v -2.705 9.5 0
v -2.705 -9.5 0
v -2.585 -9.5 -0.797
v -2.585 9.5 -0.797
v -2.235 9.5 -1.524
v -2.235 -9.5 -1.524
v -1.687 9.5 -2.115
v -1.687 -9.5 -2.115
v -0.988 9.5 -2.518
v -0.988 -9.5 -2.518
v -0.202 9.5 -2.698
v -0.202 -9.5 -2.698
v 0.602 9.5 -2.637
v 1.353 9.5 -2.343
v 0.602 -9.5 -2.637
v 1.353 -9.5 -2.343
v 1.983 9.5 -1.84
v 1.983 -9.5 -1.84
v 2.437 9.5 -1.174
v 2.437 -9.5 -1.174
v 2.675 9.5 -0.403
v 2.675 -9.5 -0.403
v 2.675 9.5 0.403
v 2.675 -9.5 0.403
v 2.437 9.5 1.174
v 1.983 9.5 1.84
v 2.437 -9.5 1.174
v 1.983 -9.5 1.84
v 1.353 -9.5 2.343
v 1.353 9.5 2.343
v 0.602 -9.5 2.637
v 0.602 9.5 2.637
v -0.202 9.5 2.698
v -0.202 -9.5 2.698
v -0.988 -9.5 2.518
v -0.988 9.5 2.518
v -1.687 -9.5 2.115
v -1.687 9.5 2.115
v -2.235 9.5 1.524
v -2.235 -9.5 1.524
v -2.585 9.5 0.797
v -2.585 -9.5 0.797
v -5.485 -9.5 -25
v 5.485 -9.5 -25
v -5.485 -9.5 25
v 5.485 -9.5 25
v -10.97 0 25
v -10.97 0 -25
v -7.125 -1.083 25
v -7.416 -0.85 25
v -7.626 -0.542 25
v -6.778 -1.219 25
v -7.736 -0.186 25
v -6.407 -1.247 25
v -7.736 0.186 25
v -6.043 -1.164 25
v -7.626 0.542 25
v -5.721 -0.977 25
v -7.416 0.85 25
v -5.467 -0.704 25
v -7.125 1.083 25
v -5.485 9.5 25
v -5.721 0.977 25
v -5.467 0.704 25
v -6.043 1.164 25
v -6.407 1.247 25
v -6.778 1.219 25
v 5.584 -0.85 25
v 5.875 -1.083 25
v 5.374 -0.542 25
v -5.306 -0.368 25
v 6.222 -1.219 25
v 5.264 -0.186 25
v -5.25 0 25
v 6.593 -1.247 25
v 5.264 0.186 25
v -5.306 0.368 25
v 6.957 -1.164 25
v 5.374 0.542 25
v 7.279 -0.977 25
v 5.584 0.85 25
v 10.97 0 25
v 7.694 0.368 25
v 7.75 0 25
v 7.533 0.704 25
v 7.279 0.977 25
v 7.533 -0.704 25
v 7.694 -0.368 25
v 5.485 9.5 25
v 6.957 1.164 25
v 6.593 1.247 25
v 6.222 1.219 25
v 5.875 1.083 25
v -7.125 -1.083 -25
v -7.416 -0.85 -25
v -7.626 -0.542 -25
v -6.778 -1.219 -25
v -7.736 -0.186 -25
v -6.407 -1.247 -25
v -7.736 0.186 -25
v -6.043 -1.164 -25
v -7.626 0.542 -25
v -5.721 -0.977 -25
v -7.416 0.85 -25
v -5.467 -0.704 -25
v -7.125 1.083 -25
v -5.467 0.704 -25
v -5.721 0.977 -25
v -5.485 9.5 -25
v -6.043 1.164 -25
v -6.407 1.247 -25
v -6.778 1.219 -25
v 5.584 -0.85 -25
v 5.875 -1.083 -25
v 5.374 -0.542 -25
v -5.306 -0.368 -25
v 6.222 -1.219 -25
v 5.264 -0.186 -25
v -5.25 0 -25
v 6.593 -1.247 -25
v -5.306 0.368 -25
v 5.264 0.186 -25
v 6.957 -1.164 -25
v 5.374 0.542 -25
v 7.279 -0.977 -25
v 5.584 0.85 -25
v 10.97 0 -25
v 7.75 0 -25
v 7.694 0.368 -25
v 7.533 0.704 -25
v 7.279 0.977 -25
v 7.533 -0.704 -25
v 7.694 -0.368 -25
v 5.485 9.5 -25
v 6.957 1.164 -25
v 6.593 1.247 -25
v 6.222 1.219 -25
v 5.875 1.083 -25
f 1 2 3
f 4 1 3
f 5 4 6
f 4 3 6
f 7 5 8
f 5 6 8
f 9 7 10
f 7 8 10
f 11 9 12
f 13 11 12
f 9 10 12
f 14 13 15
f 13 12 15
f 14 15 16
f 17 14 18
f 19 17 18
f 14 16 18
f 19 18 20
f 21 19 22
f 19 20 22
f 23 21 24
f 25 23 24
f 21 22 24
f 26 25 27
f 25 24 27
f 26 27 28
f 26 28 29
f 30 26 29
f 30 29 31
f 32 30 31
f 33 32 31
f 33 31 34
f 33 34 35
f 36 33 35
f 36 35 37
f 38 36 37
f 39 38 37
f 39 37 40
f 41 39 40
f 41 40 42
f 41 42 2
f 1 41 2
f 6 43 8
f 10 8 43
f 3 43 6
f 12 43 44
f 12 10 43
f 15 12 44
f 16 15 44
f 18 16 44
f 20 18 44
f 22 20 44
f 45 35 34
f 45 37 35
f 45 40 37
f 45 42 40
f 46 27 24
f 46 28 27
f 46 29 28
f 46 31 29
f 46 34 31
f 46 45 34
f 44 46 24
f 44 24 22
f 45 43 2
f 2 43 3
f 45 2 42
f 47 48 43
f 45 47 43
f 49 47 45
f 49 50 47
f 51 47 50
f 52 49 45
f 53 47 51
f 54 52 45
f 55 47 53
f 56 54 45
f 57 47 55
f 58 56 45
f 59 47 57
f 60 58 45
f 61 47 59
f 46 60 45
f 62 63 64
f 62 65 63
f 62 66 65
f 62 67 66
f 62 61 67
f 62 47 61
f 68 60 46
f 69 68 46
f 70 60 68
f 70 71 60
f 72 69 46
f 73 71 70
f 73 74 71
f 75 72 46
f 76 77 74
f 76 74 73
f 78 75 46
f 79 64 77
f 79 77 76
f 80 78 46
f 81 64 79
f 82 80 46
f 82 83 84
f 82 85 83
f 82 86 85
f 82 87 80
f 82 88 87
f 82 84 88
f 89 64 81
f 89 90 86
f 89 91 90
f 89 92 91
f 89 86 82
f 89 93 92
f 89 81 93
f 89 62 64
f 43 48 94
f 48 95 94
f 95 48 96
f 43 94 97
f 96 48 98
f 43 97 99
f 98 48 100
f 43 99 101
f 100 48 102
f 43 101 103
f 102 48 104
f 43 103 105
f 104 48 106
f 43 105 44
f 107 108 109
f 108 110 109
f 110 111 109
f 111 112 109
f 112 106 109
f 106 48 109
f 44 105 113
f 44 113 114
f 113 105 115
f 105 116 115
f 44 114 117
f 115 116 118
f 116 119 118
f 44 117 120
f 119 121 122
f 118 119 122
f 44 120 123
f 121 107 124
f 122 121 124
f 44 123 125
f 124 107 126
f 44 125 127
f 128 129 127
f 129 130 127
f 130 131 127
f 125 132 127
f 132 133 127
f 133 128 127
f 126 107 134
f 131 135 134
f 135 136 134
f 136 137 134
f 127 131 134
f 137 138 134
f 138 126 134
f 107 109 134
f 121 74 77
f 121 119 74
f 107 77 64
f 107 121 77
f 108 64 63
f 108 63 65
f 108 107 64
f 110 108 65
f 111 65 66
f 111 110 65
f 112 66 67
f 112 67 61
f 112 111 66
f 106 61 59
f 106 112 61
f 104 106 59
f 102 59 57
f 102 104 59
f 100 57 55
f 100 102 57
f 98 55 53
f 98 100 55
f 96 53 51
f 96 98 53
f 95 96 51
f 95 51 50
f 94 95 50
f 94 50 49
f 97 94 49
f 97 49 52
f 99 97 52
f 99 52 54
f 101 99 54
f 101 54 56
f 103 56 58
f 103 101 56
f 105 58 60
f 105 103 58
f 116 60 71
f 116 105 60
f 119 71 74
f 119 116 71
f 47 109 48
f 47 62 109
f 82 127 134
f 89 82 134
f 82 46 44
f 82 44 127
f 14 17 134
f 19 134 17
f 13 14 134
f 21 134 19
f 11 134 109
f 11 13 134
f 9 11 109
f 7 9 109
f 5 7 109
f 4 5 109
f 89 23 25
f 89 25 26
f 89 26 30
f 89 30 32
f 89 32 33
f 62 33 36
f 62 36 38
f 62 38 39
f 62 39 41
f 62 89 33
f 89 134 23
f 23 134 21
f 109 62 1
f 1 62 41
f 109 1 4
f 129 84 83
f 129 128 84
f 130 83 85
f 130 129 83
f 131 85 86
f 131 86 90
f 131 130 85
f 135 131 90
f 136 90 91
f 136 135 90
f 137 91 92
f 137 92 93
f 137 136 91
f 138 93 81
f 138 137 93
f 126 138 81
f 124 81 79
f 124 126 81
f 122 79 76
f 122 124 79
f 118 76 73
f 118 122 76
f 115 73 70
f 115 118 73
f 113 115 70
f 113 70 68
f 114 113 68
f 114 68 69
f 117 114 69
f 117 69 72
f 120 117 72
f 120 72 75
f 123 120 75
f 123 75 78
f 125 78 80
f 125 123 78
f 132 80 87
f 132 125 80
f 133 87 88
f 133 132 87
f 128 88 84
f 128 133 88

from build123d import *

# Parameters (mm, degrees)
SKETCH1_R                   = 1.25
BOSS_EXTRUDE1_DEPTH         = 25
F_1_4_28_TAPPED_HOLE1_D     = 5.4102
F_1_4_28_TAPPED_HOLE1_DEPTH = 19


with BuildPart() as part:
    # Sketch1 → Boss-Extrude1 (new body, symmetric)
    with BuildSketch(Plane.XY):
        Polygon((-5.484827557, -9.5), (5.484827557, -9.5), (10.969655115, 0), (5.484827557, 9.5), (-5.484827557, 9.5), (-10.969655115, 0), align=None)
        with Locations((-6.5, 0)):
            Circle(SKETCH1_R, mode=Mode.SUBTRACT)
        with Locations((6.5, 0)):
            Circle(SKETCH1_R, mode=Mode.SUBTRACT)
    extrude(amount=BOSS_EXTRUDE1_DEPTH, both=True)

    # 1/4-28 Tapped Hole1
    with Locations(Plane(origin=(0, 9.5, 0), x_dir=(1, 0, 0), z_dir=(0, 1, 0))):
        with Locations((0, 0)):
            Hole(F_1_4_28_TAPPED_HOLE1_D / 2, depth=F_1_4_28_TAPPED_HOLE1_DEPTH)


solid = part.part
